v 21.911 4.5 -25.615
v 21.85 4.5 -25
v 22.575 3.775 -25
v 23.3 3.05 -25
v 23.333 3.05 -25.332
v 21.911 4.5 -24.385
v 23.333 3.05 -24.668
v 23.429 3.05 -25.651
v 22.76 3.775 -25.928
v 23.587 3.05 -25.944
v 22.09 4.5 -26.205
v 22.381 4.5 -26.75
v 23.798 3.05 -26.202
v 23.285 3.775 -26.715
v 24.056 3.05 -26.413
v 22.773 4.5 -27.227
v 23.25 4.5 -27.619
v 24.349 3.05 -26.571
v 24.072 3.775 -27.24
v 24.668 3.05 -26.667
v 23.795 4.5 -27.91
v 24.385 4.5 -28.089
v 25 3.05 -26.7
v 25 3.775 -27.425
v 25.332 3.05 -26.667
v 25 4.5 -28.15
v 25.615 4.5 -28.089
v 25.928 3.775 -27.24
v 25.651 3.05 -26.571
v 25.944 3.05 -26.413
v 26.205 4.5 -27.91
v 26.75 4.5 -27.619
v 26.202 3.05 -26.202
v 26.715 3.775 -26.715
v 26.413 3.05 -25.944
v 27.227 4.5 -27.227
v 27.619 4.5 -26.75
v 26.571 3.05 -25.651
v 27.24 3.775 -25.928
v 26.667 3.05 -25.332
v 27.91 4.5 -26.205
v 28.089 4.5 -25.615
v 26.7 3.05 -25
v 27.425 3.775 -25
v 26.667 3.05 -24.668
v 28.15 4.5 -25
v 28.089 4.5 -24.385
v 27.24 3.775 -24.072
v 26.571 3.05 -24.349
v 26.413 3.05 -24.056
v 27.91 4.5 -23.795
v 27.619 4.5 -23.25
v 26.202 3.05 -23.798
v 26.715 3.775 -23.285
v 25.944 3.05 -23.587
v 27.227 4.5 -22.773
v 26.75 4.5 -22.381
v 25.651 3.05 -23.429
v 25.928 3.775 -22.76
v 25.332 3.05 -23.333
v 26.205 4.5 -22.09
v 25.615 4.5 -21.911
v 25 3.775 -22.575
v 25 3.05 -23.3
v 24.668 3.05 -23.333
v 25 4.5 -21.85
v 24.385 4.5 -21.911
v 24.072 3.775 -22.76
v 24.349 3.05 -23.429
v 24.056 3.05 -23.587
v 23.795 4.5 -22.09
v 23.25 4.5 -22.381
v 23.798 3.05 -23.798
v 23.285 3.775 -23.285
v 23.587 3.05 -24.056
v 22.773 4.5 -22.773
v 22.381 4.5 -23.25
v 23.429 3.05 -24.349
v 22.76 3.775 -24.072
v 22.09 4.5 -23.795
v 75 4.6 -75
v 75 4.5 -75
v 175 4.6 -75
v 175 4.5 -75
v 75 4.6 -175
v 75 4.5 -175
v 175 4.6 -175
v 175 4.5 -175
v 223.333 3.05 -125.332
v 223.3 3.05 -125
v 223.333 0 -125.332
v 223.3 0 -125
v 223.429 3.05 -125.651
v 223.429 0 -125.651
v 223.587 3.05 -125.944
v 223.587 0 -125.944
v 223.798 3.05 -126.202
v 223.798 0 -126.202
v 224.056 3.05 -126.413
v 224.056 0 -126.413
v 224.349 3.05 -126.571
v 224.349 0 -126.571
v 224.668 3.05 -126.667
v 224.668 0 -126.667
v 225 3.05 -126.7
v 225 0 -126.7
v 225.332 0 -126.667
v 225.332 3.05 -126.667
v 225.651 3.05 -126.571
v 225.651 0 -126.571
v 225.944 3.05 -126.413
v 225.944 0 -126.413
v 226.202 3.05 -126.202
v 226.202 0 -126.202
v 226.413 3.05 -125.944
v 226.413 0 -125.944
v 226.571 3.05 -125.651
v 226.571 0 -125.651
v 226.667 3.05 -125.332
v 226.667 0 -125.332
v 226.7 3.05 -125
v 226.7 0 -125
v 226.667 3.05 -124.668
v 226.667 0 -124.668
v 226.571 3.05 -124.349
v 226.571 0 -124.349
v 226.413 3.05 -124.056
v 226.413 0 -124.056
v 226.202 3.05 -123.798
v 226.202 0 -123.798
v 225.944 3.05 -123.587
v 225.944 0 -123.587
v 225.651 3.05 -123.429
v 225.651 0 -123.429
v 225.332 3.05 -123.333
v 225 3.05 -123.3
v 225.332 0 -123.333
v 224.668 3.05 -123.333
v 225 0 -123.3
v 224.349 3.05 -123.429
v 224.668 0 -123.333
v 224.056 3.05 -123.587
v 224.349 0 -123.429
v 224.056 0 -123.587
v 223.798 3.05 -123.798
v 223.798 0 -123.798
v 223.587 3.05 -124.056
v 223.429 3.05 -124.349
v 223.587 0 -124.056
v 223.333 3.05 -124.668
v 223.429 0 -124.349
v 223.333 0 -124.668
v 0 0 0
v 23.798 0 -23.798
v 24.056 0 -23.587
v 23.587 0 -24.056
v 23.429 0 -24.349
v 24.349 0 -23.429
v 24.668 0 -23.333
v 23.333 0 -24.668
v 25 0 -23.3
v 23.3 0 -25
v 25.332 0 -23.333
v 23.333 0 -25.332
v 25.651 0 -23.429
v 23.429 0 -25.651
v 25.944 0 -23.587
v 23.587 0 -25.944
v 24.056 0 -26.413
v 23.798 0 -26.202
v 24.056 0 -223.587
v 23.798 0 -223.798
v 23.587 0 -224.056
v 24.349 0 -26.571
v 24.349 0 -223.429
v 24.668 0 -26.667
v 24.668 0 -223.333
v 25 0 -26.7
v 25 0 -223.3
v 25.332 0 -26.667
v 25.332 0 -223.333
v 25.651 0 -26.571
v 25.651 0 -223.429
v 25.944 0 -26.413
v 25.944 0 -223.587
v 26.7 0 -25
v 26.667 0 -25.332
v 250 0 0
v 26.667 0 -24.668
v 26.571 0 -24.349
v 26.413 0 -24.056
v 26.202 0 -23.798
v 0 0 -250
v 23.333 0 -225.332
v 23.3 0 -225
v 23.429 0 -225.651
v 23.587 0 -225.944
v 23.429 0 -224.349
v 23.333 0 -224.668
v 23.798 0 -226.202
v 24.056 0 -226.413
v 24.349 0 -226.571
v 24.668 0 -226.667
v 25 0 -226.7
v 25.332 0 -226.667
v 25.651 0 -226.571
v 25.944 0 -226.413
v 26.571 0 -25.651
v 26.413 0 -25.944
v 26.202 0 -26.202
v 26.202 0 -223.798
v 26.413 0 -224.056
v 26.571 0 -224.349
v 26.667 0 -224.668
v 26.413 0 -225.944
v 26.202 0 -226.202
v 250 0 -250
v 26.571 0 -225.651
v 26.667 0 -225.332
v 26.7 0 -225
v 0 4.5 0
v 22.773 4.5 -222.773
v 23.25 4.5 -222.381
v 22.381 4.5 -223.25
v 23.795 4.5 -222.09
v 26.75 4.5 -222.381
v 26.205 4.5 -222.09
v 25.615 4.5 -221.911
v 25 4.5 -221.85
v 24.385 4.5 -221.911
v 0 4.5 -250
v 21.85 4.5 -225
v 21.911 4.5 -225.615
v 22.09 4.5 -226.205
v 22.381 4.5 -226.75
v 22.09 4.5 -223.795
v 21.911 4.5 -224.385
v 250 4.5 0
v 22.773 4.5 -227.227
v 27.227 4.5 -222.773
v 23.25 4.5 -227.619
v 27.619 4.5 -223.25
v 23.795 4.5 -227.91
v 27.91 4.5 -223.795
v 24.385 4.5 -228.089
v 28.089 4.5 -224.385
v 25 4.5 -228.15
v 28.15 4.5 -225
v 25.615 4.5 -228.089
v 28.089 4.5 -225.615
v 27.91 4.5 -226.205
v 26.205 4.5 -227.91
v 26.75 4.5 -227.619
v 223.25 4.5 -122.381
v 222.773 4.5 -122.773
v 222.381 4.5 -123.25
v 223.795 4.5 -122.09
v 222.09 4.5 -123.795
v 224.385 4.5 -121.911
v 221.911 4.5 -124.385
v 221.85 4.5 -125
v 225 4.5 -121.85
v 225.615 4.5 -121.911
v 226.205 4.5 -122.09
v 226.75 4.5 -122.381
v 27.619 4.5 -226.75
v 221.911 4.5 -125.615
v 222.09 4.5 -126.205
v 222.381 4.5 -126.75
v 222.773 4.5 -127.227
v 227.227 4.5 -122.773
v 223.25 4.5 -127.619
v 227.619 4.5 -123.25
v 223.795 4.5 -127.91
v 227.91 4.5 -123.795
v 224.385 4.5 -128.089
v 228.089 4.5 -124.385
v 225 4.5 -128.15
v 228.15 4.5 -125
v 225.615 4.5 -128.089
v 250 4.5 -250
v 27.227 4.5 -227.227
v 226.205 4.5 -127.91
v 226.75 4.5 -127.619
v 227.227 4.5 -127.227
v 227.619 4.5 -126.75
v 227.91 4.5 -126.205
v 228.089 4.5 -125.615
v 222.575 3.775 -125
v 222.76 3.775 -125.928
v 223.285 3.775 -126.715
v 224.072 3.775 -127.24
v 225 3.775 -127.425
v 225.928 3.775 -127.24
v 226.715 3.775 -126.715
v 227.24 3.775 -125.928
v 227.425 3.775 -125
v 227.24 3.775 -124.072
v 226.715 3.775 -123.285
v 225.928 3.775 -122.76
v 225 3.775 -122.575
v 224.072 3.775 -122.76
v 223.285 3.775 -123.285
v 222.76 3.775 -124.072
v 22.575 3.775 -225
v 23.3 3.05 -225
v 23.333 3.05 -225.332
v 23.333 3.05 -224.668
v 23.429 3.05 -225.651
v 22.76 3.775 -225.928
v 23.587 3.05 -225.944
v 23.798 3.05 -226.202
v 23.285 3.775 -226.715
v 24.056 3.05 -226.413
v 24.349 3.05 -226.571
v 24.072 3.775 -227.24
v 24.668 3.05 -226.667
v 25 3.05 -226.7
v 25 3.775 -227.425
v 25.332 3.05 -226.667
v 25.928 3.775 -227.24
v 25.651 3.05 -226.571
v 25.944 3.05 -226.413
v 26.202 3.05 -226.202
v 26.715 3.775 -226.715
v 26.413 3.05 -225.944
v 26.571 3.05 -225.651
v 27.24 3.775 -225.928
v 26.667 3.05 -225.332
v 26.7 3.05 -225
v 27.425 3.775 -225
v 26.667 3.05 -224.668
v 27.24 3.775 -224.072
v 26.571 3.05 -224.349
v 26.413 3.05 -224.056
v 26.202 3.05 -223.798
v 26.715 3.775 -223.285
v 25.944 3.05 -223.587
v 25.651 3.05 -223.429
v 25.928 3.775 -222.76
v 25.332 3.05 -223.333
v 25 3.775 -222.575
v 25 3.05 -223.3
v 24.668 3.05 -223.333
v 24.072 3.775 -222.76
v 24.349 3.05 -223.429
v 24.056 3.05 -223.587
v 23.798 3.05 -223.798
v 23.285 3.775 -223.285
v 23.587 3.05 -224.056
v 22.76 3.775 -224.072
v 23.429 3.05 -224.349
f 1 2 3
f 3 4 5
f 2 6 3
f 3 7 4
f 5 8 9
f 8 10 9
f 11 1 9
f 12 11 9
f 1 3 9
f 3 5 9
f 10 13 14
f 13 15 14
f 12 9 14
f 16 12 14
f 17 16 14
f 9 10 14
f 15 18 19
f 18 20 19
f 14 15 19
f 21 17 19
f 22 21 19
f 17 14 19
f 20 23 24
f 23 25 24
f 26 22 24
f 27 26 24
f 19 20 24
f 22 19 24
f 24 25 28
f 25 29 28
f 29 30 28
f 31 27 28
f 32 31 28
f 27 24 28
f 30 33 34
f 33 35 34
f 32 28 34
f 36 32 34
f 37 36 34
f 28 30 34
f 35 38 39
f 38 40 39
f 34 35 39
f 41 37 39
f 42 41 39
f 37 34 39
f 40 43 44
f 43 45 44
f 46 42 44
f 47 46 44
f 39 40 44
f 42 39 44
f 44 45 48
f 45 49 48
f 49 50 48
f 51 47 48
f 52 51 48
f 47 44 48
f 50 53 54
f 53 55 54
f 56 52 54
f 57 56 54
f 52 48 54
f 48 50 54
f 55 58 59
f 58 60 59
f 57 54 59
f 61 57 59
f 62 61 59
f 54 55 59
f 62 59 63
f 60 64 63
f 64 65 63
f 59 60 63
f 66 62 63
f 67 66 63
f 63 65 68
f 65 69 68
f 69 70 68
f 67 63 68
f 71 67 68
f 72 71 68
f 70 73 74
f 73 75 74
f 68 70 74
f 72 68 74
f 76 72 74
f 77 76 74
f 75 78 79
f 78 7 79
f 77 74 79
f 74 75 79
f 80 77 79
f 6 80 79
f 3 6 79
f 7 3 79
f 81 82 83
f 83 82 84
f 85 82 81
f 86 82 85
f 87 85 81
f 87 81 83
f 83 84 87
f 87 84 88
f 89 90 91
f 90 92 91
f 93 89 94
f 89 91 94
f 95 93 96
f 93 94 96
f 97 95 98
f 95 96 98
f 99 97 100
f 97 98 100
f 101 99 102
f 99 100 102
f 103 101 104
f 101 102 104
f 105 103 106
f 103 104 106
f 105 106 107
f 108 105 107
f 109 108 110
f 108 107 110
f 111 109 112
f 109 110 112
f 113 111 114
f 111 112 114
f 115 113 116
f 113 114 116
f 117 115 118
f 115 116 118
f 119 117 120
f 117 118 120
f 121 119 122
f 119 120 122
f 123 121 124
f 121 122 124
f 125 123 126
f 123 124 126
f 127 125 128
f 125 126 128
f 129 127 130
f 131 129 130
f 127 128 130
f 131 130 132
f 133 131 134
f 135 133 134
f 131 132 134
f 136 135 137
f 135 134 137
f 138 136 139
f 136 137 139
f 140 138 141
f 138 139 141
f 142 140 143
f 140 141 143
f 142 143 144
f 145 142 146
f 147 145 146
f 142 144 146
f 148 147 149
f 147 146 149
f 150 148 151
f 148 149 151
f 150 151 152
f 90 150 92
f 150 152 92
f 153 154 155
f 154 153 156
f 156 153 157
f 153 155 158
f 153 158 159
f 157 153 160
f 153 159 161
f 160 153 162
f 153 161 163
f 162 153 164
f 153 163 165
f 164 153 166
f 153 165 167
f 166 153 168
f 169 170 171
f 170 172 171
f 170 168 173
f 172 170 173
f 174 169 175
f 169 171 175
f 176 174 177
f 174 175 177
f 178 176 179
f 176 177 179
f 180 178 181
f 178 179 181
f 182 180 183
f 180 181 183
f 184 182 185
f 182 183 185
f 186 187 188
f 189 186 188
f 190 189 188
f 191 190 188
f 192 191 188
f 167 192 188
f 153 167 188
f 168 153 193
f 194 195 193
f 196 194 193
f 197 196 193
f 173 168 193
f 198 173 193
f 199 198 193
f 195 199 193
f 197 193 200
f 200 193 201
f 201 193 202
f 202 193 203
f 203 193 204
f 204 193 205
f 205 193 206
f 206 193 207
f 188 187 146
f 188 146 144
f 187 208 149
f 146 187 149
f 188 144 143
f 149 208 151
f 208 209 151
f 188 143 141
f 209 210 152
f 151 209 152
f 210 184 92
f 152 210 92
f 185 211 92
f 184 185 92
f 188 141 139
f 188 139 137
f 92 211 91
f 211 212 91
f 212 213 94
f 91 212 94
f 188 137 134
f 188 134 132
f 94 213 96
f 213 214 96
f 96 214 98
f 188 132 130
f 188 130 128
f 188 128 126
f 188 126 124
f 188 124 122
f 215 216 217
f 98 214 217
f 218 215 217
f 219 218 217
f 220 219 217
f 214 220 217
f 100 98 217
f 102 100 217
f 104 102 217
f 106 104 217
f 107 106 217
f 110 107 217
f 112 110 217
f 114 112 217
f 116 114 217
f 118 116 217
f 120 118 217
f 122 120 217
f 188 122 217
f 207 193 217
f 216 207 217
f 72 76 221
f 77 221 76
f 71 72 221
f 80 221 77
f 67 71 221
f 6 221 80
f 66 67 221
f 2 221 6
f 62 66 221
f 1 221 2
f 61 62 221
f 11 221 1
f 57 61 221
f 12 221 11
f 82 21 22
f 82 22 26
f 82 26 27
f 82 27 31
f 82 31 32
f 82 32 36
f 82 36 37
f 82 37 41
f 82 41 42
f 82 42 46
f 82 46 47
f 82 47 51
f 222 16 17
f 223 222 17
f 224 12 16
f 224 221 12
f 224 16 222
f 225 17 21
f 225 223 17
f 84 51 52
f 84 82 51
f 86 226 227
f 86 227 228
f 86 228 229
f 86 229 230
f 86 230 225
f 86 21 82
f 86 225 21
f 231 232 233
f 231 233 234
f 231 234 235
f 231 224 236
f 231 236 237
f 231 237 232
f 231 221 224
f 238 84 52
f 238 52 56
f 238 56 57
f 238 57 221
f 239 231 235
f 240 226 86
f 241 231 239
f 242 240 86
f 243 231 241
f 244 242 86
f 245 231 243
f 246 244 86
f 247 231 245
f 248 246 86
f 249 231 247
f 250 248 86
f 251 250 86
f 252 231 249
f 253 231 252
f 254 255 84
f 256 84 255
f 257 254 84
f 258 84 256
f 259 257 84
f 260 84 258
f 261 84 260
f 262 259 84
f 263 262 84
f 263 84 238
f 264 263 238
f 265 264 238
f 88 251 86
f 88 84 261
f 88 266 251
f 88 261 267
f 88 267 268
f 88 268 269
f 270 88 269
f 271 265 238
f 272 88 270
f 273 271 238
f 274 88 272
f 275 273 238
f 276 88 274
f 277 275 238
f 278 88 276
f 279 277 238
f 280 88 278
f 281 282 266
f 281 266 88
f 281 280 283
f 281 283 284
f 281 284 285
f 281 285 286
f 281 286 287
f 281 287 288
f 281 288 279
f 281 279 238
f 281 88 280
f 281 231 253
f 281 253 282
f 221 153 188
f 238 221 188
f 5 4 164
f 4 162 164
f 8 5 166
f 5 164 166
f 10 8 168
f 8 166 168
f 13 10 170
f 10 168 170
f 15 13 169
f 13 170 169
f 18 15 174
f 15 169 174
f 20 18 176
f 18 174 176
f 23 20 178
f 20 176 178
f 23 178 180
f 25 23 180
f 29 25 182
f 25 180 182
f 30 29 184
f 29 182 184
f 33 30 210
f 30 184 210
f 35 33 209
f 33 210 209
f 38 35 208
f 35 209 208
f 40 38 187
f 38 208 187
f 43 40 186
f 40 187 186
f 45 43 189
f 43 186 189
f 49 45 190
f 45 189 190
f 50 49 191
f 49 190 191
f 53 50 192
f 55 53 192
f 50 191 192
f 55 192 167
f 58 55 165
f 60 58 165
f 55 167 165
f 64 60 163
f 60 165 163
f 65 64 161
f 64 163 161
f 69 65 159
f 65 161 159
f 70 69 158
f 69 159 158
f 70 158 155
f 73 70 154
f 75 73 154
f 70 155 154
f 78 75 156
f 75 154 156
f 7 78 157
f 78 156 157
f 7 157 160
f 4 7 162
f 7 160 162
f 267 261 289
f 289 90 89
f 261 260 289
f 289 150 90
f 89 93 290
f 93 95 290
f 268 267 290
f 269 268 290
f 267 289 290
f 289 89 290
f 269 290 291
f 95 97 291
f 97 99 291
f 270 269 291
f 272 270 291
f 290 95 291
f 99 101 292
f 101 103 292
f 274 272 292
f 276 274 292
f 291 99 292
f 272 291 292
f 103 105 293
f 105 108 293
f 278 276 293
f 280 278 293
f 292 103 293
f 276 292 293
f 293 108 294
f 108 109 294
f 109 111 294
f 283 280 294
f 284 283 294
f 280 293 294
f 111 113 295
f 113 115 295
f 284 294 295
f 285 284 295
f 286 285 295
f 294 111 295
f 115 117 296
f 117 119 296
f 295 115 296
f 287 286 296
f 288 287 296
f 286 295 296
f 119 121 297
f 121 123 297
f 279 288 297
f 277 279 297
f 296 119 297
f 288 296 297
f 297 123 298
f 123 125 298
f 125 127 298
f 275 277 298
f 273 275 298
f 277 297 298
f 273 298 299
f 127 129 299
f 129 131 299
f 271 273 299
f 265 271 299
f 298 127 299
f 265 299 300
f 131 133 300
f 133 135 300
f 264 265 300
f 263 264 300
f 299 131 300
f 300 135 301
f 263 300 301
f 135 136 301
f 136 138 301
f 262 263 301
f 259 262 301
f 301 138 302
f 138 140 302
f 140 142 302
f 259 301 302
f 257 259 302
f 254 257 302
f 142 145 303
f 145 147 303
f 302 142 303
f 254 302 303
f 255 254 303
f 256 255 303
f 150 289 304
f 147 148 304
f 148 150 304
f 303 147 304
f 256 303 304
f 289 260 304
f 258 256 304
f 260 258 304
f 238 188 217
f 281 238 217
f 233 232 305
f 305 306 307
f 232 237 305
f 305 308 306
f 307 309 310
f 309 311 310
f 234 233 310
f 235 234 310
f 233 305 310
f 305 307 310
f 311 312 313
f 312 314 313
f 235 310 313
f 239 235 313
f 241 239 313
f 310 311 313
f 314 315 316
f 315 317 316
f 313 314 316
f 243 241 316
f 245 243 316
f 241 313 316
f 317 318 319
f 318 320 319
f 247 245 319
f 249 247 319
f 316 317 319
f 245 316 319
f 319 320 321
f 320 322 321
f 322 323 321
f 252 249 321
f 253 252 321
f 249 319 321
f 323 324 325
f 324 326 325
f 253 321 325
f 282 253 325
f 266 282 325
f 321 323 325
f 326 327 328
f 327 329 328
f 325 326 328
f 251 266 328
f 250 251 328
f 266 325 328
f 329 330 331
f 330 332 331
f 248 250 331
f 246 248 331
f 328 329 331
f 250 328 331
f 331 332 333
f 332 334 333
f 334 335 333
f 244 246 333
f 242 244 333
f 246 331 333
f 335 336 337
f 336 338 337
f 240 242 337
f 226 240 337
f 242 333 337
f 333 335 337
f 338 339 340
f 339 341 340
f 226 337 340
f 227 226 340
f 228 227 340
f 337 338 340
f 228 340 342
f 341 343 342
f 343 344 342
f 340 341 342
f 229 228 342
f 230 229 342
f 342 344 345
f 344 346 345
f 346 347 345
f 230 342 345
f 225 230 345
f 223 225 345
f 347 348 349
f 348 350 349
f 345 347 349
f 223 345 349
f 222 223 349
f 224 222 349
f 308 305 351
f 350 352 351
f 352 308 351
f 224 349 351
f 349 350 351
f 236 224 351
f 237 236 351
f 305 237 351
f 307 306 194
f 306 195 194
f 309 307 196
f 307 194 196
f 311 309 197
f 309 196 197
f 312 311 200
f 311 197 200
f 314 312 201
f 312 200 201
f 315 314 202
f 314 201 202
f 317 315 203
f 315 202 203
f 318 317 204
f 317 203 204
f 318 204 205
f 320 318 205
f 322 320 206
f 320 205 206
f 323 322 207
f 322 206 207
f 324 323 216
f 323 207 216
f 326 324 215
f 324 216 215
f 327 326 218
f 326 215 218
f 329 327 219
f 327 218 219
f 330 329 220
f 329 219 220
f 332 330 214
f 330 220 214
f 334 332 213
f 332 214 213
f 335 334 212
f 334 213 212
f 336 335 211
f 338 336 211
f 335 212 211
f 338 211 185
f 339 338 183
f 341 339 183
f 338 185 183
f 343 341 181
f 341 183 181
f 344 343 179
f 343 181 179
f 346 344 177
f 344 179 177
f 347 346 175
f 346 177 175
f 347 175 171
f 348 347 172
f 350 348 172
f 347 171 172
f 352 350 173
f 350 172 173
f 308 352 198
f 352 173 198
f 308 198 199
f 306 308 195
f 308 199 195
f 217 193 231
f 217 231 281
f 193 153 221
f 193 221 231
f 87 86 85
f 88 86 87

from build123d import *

# Parameters (mm, degrees)
SKETCH1_W                                       = 250
SKETCH1_H                                       = 250
BOSS_EXTRUDE2_DEPTH                             = 4.5
CSK_FOR_M3_FLAT_HEAD_MACHINE_SCREW1_D           = 3.4
CSK_FOR_M3_FLAT_HEAD_MACHINE_SCREW1_CSINK_D     = 6.3
CSK_FOR_M3_FLAT_HEAD_MACHINE_SCREW1_CSINK_ANGLE = 90
SKETCH5_W                                       = 100
SKETCH5_H                                       = 100
BOSS_EXTRUDE3_DEPTH                             = 0.1


with BuildPart() as part:
    # Sketch1 → Boss-Extrude2 (new body)
    with BuildSketch(Plane(origin=(0, 0, 0), x_dir=(1, 0, 0), z_dir=(0, 1, 0))):
        with Locations((125, 125)):
            Rectangle(SKETCH1_W, SKETCH1_H)
    extrude(amount=BOSS_EXTRUDE2_DEPTH)

    # CSK for M3 Flat Head Machine Screw1 (through all)
    with Locations(Plane(origin=(0, 4.5, 0), x_dir=(1, 0, 0), z_dir=(0, 1, 0))):
        with Locations((25, 25), (25, 225), (225, 125)):
            CounterSinkHole(CSK_FOR_M3_FLAT_HEAD_MACHINE_SCREW1_D / 2, CSK_FOR_M3_FLAT_HEAD_MACHINE_SCREW1_CSINK_D / 2, counter_sink_angle=CSK_FOR_M3_FLAT_HEAD_MACHINE_SCREW1_CSINK_ANGLE)

    # Sketch5 → Boss-Extrude3 (add)
    with BuildSketch(Plane(origin=(0, 4.5, 0), x_dir=(1, 0, 0), z_dir=(0, 1, 0))):
        with Locations((125, 125)):
            Rectangle(SKETCH5_W, SKETCH5_H)
    extrude(amount=BOSS_EXTRUDE3_DEPTH)


solid = part.part
